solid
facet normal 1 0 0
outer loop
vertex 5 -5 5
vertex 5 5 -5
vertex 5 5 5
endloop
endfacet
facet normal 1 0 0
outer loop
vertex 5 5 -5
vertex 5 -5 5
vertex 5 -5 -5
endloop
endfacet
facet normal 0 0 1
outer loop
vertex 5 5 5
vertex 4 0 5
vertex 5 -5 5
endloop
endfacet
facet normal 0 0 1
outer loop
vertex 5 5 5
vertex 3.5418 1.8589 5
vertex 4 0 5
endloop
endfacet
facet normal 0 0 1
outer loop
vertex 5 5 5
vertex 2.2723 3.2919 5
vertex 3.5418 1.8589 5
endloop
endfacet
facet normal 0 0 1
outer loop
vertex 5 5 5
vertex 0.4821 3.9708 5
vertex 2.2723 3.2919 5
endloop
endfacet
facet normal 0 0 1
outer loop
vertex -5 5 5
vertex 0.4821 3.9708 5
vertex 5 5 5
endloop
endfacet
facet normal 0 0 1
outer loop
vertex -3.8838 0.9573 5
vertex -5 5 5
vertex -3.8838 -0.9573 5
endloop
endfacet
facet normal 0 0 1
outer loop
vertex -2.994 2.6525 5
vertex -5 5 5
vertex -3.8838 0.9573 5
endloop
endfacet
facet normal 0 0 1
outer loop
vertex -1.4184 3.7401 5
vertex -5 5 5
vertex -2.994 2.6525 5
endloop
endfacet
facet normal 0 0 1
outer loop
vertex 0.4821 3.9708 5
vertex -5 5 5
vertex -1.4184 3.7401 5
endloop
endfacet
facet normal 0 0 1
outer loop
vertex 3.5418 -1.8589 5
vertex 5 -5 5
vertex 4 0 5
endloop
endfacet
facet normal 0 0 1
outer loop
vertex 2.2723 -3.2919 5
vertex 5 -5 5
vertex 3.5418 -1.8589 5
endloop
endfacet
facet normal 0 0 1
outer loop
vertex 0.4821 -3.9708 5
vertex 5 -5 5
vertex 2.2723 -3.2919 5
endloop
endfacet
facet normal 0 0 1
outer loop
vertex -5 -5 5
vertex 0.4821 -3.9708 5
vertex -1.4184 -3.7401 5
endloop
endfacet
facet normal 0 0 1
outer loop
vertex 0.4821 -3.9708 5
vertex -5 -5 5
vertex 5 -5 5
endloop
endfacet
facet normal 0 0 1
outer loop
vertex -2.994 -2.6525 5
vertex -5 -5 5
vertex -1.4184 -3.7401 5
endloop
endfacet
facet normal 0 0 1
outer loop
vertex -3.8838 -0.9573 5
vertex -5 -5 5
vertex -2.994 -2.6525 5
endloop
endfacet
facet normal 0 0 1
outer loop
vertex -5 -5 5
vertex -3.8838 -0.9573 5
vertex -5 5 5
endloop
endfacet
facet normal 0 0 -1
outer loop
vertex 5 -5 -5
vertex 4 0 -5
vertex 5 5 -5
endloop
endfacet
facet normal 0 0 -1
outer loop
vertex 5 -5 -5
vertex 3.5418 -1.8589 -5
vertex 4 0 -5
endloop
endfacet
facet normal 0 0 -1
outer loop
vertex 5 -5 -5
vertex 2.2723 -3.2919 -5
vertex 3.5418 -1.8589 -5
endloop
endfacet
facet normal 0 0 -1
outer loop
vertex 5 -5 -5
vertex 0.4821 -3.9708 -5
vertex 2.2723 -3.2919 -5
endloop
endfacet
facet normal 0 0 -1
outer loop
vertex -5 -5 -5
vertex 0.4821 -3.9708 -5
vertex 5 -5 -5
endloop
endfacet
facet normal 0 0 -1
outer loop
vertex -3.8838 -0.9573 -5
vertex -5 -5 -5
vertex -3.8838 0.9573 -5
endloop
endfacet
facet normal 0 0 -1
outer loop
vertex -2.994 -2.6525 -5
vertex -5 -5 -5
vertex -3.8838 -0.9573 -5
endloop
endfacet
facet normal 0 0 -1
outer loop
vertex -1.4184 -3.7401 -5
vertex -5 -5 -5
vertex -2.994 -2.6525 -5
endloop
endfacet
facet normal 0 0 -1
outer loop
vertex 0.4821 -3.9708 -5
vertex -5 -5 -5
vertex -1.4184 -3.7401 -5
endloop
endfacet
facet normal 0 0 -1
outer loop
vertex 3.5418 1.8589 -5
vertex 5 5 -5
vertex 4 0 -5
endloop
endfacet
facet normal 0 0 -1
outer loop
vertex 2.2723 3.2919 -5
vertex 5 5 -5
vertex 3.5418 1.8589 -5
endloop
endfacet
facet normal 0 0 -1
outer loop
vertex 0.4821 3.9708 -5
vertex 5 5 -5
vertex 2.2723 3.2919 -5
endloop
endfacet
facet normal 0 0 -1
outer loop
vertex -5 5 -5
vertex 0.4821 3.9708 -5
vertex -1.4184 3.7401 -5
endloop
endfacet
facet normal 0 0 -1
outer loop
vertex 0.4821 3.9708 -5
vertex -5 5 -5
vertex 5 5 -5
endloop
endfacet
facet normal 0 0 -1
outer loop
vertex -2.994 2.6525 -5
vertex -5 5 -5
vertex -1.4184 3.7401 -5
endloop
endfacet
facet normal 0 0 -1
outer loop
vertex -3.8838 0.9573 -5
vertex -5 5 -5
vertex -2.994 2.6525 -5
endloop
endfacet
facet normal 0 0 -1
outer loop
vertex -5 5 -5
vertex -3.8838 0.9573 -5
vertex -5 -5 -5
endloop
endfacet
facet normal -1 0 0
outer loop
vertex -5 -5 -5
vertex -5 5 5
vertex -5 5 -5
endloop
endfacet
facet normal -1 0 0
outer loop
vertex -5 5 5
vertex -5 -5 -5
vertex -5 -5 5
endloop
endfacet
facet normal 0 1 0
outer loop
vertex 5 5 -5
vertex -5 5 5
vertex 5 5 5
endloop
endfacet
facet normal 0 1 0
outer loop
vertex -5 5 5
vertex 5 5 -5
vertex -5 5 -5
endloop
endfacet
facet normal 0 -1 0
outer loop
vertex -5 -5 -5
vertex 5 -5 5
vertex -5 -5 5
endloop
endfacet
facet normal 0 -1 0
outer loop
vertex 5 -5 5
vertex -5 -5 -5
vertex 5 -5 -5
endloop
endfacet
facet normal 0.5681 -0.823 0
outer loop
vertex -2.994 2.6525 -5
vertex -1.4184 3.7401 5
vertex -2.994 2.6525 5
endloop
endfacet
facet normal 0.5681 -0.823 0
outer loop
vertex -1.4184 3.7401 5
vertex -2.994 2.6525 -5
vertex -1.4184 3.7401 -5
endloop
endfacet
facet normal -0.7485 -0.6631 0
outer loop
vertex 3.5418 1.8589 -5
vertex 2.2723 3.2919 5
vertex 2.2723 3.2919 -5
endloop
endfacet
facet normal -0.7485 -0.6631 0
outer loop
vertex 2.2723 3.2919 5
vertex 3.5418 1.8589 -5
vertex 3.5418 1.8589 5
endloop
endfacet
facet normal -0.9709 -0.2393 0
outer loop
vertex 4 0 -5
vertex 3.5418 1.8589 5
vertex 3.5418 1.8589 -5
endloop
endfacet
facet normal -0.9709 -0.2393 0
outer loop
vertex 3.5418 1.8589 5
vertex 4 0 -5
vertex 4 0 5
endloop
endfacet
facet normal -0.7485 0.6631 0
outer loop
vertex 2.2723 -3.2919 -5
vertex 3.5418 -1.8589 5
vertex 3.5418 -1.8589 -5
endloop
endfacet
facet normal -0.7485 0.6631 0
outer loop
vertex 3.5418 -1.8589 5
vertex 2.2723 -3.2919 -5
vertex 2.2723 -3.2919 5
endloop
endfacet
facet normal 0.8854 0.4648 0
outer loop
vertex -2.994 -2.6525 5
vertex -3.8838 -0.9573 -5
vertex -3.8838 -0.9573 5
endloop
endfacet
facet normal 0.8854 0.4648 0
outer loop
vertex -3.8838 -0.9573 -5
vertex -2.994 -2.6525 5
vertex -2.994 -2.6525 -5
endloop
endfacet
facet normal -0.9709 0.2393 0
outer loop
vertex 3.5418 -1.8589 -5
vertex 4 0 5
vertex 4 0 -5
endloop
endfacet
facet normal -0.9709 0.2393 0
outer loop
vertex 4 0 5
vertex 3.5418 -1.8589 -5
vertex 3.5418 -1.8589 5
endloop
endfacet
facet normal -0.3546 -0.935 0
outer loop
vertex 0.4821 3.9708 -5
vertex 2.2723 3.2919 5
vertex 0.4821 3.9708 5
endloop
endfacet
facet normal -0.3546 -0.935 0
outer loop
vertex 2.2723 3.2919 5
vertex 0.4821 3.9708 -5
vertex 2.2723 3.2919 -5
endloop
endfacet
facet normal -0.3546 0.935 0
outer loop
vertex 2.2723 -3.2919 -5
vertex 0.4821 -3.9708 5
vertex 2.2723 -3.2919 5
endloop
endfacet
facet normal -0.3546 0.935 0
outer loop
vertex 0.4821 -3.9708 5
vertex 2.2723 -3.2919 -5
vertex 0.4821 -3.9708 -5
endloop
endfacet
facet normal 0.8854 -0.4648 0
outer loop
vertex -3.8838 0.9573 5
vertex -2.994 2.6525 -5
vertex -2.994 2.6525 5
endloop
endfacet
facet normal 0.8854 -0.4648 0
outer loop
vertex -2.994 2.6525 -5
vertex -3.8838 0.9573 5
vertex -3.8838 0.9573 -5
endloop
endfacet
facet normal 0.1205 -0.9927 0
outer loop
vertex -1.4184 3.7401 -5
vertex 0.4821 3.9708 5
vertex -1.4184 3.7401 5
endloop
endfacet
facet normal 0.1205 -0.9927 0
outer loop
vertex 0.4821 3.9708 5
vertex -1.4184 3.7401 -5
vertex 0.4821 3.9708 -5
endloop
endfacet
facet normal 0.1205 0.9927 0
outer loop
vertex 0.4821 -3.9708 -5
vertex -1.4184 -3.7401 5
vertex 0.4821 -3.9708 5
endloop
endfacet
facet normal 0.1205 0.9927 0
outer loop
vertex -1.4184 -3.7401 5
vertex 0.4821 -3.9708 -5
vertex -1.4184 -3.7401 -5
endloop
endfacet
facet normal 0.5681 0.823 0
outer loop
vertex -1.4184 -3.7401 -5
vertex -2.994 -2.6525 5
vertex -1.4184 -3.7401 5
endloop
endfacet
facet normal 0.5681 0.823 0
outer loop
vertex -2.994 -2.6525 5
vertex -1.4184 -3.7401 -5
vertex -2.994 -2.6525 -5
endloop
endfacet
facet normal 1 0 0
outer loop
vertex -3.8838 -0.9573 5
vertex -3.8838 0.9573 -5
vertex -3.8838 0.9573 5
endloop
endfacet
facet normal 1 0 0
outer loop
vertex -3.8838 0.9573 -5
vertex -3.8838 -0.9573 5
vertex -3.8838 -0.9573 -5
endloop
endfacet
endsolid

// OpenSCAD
difference() {
  cube([10,10,10], center=true);
  cylinder(r=4, h=20, center=true);
}
